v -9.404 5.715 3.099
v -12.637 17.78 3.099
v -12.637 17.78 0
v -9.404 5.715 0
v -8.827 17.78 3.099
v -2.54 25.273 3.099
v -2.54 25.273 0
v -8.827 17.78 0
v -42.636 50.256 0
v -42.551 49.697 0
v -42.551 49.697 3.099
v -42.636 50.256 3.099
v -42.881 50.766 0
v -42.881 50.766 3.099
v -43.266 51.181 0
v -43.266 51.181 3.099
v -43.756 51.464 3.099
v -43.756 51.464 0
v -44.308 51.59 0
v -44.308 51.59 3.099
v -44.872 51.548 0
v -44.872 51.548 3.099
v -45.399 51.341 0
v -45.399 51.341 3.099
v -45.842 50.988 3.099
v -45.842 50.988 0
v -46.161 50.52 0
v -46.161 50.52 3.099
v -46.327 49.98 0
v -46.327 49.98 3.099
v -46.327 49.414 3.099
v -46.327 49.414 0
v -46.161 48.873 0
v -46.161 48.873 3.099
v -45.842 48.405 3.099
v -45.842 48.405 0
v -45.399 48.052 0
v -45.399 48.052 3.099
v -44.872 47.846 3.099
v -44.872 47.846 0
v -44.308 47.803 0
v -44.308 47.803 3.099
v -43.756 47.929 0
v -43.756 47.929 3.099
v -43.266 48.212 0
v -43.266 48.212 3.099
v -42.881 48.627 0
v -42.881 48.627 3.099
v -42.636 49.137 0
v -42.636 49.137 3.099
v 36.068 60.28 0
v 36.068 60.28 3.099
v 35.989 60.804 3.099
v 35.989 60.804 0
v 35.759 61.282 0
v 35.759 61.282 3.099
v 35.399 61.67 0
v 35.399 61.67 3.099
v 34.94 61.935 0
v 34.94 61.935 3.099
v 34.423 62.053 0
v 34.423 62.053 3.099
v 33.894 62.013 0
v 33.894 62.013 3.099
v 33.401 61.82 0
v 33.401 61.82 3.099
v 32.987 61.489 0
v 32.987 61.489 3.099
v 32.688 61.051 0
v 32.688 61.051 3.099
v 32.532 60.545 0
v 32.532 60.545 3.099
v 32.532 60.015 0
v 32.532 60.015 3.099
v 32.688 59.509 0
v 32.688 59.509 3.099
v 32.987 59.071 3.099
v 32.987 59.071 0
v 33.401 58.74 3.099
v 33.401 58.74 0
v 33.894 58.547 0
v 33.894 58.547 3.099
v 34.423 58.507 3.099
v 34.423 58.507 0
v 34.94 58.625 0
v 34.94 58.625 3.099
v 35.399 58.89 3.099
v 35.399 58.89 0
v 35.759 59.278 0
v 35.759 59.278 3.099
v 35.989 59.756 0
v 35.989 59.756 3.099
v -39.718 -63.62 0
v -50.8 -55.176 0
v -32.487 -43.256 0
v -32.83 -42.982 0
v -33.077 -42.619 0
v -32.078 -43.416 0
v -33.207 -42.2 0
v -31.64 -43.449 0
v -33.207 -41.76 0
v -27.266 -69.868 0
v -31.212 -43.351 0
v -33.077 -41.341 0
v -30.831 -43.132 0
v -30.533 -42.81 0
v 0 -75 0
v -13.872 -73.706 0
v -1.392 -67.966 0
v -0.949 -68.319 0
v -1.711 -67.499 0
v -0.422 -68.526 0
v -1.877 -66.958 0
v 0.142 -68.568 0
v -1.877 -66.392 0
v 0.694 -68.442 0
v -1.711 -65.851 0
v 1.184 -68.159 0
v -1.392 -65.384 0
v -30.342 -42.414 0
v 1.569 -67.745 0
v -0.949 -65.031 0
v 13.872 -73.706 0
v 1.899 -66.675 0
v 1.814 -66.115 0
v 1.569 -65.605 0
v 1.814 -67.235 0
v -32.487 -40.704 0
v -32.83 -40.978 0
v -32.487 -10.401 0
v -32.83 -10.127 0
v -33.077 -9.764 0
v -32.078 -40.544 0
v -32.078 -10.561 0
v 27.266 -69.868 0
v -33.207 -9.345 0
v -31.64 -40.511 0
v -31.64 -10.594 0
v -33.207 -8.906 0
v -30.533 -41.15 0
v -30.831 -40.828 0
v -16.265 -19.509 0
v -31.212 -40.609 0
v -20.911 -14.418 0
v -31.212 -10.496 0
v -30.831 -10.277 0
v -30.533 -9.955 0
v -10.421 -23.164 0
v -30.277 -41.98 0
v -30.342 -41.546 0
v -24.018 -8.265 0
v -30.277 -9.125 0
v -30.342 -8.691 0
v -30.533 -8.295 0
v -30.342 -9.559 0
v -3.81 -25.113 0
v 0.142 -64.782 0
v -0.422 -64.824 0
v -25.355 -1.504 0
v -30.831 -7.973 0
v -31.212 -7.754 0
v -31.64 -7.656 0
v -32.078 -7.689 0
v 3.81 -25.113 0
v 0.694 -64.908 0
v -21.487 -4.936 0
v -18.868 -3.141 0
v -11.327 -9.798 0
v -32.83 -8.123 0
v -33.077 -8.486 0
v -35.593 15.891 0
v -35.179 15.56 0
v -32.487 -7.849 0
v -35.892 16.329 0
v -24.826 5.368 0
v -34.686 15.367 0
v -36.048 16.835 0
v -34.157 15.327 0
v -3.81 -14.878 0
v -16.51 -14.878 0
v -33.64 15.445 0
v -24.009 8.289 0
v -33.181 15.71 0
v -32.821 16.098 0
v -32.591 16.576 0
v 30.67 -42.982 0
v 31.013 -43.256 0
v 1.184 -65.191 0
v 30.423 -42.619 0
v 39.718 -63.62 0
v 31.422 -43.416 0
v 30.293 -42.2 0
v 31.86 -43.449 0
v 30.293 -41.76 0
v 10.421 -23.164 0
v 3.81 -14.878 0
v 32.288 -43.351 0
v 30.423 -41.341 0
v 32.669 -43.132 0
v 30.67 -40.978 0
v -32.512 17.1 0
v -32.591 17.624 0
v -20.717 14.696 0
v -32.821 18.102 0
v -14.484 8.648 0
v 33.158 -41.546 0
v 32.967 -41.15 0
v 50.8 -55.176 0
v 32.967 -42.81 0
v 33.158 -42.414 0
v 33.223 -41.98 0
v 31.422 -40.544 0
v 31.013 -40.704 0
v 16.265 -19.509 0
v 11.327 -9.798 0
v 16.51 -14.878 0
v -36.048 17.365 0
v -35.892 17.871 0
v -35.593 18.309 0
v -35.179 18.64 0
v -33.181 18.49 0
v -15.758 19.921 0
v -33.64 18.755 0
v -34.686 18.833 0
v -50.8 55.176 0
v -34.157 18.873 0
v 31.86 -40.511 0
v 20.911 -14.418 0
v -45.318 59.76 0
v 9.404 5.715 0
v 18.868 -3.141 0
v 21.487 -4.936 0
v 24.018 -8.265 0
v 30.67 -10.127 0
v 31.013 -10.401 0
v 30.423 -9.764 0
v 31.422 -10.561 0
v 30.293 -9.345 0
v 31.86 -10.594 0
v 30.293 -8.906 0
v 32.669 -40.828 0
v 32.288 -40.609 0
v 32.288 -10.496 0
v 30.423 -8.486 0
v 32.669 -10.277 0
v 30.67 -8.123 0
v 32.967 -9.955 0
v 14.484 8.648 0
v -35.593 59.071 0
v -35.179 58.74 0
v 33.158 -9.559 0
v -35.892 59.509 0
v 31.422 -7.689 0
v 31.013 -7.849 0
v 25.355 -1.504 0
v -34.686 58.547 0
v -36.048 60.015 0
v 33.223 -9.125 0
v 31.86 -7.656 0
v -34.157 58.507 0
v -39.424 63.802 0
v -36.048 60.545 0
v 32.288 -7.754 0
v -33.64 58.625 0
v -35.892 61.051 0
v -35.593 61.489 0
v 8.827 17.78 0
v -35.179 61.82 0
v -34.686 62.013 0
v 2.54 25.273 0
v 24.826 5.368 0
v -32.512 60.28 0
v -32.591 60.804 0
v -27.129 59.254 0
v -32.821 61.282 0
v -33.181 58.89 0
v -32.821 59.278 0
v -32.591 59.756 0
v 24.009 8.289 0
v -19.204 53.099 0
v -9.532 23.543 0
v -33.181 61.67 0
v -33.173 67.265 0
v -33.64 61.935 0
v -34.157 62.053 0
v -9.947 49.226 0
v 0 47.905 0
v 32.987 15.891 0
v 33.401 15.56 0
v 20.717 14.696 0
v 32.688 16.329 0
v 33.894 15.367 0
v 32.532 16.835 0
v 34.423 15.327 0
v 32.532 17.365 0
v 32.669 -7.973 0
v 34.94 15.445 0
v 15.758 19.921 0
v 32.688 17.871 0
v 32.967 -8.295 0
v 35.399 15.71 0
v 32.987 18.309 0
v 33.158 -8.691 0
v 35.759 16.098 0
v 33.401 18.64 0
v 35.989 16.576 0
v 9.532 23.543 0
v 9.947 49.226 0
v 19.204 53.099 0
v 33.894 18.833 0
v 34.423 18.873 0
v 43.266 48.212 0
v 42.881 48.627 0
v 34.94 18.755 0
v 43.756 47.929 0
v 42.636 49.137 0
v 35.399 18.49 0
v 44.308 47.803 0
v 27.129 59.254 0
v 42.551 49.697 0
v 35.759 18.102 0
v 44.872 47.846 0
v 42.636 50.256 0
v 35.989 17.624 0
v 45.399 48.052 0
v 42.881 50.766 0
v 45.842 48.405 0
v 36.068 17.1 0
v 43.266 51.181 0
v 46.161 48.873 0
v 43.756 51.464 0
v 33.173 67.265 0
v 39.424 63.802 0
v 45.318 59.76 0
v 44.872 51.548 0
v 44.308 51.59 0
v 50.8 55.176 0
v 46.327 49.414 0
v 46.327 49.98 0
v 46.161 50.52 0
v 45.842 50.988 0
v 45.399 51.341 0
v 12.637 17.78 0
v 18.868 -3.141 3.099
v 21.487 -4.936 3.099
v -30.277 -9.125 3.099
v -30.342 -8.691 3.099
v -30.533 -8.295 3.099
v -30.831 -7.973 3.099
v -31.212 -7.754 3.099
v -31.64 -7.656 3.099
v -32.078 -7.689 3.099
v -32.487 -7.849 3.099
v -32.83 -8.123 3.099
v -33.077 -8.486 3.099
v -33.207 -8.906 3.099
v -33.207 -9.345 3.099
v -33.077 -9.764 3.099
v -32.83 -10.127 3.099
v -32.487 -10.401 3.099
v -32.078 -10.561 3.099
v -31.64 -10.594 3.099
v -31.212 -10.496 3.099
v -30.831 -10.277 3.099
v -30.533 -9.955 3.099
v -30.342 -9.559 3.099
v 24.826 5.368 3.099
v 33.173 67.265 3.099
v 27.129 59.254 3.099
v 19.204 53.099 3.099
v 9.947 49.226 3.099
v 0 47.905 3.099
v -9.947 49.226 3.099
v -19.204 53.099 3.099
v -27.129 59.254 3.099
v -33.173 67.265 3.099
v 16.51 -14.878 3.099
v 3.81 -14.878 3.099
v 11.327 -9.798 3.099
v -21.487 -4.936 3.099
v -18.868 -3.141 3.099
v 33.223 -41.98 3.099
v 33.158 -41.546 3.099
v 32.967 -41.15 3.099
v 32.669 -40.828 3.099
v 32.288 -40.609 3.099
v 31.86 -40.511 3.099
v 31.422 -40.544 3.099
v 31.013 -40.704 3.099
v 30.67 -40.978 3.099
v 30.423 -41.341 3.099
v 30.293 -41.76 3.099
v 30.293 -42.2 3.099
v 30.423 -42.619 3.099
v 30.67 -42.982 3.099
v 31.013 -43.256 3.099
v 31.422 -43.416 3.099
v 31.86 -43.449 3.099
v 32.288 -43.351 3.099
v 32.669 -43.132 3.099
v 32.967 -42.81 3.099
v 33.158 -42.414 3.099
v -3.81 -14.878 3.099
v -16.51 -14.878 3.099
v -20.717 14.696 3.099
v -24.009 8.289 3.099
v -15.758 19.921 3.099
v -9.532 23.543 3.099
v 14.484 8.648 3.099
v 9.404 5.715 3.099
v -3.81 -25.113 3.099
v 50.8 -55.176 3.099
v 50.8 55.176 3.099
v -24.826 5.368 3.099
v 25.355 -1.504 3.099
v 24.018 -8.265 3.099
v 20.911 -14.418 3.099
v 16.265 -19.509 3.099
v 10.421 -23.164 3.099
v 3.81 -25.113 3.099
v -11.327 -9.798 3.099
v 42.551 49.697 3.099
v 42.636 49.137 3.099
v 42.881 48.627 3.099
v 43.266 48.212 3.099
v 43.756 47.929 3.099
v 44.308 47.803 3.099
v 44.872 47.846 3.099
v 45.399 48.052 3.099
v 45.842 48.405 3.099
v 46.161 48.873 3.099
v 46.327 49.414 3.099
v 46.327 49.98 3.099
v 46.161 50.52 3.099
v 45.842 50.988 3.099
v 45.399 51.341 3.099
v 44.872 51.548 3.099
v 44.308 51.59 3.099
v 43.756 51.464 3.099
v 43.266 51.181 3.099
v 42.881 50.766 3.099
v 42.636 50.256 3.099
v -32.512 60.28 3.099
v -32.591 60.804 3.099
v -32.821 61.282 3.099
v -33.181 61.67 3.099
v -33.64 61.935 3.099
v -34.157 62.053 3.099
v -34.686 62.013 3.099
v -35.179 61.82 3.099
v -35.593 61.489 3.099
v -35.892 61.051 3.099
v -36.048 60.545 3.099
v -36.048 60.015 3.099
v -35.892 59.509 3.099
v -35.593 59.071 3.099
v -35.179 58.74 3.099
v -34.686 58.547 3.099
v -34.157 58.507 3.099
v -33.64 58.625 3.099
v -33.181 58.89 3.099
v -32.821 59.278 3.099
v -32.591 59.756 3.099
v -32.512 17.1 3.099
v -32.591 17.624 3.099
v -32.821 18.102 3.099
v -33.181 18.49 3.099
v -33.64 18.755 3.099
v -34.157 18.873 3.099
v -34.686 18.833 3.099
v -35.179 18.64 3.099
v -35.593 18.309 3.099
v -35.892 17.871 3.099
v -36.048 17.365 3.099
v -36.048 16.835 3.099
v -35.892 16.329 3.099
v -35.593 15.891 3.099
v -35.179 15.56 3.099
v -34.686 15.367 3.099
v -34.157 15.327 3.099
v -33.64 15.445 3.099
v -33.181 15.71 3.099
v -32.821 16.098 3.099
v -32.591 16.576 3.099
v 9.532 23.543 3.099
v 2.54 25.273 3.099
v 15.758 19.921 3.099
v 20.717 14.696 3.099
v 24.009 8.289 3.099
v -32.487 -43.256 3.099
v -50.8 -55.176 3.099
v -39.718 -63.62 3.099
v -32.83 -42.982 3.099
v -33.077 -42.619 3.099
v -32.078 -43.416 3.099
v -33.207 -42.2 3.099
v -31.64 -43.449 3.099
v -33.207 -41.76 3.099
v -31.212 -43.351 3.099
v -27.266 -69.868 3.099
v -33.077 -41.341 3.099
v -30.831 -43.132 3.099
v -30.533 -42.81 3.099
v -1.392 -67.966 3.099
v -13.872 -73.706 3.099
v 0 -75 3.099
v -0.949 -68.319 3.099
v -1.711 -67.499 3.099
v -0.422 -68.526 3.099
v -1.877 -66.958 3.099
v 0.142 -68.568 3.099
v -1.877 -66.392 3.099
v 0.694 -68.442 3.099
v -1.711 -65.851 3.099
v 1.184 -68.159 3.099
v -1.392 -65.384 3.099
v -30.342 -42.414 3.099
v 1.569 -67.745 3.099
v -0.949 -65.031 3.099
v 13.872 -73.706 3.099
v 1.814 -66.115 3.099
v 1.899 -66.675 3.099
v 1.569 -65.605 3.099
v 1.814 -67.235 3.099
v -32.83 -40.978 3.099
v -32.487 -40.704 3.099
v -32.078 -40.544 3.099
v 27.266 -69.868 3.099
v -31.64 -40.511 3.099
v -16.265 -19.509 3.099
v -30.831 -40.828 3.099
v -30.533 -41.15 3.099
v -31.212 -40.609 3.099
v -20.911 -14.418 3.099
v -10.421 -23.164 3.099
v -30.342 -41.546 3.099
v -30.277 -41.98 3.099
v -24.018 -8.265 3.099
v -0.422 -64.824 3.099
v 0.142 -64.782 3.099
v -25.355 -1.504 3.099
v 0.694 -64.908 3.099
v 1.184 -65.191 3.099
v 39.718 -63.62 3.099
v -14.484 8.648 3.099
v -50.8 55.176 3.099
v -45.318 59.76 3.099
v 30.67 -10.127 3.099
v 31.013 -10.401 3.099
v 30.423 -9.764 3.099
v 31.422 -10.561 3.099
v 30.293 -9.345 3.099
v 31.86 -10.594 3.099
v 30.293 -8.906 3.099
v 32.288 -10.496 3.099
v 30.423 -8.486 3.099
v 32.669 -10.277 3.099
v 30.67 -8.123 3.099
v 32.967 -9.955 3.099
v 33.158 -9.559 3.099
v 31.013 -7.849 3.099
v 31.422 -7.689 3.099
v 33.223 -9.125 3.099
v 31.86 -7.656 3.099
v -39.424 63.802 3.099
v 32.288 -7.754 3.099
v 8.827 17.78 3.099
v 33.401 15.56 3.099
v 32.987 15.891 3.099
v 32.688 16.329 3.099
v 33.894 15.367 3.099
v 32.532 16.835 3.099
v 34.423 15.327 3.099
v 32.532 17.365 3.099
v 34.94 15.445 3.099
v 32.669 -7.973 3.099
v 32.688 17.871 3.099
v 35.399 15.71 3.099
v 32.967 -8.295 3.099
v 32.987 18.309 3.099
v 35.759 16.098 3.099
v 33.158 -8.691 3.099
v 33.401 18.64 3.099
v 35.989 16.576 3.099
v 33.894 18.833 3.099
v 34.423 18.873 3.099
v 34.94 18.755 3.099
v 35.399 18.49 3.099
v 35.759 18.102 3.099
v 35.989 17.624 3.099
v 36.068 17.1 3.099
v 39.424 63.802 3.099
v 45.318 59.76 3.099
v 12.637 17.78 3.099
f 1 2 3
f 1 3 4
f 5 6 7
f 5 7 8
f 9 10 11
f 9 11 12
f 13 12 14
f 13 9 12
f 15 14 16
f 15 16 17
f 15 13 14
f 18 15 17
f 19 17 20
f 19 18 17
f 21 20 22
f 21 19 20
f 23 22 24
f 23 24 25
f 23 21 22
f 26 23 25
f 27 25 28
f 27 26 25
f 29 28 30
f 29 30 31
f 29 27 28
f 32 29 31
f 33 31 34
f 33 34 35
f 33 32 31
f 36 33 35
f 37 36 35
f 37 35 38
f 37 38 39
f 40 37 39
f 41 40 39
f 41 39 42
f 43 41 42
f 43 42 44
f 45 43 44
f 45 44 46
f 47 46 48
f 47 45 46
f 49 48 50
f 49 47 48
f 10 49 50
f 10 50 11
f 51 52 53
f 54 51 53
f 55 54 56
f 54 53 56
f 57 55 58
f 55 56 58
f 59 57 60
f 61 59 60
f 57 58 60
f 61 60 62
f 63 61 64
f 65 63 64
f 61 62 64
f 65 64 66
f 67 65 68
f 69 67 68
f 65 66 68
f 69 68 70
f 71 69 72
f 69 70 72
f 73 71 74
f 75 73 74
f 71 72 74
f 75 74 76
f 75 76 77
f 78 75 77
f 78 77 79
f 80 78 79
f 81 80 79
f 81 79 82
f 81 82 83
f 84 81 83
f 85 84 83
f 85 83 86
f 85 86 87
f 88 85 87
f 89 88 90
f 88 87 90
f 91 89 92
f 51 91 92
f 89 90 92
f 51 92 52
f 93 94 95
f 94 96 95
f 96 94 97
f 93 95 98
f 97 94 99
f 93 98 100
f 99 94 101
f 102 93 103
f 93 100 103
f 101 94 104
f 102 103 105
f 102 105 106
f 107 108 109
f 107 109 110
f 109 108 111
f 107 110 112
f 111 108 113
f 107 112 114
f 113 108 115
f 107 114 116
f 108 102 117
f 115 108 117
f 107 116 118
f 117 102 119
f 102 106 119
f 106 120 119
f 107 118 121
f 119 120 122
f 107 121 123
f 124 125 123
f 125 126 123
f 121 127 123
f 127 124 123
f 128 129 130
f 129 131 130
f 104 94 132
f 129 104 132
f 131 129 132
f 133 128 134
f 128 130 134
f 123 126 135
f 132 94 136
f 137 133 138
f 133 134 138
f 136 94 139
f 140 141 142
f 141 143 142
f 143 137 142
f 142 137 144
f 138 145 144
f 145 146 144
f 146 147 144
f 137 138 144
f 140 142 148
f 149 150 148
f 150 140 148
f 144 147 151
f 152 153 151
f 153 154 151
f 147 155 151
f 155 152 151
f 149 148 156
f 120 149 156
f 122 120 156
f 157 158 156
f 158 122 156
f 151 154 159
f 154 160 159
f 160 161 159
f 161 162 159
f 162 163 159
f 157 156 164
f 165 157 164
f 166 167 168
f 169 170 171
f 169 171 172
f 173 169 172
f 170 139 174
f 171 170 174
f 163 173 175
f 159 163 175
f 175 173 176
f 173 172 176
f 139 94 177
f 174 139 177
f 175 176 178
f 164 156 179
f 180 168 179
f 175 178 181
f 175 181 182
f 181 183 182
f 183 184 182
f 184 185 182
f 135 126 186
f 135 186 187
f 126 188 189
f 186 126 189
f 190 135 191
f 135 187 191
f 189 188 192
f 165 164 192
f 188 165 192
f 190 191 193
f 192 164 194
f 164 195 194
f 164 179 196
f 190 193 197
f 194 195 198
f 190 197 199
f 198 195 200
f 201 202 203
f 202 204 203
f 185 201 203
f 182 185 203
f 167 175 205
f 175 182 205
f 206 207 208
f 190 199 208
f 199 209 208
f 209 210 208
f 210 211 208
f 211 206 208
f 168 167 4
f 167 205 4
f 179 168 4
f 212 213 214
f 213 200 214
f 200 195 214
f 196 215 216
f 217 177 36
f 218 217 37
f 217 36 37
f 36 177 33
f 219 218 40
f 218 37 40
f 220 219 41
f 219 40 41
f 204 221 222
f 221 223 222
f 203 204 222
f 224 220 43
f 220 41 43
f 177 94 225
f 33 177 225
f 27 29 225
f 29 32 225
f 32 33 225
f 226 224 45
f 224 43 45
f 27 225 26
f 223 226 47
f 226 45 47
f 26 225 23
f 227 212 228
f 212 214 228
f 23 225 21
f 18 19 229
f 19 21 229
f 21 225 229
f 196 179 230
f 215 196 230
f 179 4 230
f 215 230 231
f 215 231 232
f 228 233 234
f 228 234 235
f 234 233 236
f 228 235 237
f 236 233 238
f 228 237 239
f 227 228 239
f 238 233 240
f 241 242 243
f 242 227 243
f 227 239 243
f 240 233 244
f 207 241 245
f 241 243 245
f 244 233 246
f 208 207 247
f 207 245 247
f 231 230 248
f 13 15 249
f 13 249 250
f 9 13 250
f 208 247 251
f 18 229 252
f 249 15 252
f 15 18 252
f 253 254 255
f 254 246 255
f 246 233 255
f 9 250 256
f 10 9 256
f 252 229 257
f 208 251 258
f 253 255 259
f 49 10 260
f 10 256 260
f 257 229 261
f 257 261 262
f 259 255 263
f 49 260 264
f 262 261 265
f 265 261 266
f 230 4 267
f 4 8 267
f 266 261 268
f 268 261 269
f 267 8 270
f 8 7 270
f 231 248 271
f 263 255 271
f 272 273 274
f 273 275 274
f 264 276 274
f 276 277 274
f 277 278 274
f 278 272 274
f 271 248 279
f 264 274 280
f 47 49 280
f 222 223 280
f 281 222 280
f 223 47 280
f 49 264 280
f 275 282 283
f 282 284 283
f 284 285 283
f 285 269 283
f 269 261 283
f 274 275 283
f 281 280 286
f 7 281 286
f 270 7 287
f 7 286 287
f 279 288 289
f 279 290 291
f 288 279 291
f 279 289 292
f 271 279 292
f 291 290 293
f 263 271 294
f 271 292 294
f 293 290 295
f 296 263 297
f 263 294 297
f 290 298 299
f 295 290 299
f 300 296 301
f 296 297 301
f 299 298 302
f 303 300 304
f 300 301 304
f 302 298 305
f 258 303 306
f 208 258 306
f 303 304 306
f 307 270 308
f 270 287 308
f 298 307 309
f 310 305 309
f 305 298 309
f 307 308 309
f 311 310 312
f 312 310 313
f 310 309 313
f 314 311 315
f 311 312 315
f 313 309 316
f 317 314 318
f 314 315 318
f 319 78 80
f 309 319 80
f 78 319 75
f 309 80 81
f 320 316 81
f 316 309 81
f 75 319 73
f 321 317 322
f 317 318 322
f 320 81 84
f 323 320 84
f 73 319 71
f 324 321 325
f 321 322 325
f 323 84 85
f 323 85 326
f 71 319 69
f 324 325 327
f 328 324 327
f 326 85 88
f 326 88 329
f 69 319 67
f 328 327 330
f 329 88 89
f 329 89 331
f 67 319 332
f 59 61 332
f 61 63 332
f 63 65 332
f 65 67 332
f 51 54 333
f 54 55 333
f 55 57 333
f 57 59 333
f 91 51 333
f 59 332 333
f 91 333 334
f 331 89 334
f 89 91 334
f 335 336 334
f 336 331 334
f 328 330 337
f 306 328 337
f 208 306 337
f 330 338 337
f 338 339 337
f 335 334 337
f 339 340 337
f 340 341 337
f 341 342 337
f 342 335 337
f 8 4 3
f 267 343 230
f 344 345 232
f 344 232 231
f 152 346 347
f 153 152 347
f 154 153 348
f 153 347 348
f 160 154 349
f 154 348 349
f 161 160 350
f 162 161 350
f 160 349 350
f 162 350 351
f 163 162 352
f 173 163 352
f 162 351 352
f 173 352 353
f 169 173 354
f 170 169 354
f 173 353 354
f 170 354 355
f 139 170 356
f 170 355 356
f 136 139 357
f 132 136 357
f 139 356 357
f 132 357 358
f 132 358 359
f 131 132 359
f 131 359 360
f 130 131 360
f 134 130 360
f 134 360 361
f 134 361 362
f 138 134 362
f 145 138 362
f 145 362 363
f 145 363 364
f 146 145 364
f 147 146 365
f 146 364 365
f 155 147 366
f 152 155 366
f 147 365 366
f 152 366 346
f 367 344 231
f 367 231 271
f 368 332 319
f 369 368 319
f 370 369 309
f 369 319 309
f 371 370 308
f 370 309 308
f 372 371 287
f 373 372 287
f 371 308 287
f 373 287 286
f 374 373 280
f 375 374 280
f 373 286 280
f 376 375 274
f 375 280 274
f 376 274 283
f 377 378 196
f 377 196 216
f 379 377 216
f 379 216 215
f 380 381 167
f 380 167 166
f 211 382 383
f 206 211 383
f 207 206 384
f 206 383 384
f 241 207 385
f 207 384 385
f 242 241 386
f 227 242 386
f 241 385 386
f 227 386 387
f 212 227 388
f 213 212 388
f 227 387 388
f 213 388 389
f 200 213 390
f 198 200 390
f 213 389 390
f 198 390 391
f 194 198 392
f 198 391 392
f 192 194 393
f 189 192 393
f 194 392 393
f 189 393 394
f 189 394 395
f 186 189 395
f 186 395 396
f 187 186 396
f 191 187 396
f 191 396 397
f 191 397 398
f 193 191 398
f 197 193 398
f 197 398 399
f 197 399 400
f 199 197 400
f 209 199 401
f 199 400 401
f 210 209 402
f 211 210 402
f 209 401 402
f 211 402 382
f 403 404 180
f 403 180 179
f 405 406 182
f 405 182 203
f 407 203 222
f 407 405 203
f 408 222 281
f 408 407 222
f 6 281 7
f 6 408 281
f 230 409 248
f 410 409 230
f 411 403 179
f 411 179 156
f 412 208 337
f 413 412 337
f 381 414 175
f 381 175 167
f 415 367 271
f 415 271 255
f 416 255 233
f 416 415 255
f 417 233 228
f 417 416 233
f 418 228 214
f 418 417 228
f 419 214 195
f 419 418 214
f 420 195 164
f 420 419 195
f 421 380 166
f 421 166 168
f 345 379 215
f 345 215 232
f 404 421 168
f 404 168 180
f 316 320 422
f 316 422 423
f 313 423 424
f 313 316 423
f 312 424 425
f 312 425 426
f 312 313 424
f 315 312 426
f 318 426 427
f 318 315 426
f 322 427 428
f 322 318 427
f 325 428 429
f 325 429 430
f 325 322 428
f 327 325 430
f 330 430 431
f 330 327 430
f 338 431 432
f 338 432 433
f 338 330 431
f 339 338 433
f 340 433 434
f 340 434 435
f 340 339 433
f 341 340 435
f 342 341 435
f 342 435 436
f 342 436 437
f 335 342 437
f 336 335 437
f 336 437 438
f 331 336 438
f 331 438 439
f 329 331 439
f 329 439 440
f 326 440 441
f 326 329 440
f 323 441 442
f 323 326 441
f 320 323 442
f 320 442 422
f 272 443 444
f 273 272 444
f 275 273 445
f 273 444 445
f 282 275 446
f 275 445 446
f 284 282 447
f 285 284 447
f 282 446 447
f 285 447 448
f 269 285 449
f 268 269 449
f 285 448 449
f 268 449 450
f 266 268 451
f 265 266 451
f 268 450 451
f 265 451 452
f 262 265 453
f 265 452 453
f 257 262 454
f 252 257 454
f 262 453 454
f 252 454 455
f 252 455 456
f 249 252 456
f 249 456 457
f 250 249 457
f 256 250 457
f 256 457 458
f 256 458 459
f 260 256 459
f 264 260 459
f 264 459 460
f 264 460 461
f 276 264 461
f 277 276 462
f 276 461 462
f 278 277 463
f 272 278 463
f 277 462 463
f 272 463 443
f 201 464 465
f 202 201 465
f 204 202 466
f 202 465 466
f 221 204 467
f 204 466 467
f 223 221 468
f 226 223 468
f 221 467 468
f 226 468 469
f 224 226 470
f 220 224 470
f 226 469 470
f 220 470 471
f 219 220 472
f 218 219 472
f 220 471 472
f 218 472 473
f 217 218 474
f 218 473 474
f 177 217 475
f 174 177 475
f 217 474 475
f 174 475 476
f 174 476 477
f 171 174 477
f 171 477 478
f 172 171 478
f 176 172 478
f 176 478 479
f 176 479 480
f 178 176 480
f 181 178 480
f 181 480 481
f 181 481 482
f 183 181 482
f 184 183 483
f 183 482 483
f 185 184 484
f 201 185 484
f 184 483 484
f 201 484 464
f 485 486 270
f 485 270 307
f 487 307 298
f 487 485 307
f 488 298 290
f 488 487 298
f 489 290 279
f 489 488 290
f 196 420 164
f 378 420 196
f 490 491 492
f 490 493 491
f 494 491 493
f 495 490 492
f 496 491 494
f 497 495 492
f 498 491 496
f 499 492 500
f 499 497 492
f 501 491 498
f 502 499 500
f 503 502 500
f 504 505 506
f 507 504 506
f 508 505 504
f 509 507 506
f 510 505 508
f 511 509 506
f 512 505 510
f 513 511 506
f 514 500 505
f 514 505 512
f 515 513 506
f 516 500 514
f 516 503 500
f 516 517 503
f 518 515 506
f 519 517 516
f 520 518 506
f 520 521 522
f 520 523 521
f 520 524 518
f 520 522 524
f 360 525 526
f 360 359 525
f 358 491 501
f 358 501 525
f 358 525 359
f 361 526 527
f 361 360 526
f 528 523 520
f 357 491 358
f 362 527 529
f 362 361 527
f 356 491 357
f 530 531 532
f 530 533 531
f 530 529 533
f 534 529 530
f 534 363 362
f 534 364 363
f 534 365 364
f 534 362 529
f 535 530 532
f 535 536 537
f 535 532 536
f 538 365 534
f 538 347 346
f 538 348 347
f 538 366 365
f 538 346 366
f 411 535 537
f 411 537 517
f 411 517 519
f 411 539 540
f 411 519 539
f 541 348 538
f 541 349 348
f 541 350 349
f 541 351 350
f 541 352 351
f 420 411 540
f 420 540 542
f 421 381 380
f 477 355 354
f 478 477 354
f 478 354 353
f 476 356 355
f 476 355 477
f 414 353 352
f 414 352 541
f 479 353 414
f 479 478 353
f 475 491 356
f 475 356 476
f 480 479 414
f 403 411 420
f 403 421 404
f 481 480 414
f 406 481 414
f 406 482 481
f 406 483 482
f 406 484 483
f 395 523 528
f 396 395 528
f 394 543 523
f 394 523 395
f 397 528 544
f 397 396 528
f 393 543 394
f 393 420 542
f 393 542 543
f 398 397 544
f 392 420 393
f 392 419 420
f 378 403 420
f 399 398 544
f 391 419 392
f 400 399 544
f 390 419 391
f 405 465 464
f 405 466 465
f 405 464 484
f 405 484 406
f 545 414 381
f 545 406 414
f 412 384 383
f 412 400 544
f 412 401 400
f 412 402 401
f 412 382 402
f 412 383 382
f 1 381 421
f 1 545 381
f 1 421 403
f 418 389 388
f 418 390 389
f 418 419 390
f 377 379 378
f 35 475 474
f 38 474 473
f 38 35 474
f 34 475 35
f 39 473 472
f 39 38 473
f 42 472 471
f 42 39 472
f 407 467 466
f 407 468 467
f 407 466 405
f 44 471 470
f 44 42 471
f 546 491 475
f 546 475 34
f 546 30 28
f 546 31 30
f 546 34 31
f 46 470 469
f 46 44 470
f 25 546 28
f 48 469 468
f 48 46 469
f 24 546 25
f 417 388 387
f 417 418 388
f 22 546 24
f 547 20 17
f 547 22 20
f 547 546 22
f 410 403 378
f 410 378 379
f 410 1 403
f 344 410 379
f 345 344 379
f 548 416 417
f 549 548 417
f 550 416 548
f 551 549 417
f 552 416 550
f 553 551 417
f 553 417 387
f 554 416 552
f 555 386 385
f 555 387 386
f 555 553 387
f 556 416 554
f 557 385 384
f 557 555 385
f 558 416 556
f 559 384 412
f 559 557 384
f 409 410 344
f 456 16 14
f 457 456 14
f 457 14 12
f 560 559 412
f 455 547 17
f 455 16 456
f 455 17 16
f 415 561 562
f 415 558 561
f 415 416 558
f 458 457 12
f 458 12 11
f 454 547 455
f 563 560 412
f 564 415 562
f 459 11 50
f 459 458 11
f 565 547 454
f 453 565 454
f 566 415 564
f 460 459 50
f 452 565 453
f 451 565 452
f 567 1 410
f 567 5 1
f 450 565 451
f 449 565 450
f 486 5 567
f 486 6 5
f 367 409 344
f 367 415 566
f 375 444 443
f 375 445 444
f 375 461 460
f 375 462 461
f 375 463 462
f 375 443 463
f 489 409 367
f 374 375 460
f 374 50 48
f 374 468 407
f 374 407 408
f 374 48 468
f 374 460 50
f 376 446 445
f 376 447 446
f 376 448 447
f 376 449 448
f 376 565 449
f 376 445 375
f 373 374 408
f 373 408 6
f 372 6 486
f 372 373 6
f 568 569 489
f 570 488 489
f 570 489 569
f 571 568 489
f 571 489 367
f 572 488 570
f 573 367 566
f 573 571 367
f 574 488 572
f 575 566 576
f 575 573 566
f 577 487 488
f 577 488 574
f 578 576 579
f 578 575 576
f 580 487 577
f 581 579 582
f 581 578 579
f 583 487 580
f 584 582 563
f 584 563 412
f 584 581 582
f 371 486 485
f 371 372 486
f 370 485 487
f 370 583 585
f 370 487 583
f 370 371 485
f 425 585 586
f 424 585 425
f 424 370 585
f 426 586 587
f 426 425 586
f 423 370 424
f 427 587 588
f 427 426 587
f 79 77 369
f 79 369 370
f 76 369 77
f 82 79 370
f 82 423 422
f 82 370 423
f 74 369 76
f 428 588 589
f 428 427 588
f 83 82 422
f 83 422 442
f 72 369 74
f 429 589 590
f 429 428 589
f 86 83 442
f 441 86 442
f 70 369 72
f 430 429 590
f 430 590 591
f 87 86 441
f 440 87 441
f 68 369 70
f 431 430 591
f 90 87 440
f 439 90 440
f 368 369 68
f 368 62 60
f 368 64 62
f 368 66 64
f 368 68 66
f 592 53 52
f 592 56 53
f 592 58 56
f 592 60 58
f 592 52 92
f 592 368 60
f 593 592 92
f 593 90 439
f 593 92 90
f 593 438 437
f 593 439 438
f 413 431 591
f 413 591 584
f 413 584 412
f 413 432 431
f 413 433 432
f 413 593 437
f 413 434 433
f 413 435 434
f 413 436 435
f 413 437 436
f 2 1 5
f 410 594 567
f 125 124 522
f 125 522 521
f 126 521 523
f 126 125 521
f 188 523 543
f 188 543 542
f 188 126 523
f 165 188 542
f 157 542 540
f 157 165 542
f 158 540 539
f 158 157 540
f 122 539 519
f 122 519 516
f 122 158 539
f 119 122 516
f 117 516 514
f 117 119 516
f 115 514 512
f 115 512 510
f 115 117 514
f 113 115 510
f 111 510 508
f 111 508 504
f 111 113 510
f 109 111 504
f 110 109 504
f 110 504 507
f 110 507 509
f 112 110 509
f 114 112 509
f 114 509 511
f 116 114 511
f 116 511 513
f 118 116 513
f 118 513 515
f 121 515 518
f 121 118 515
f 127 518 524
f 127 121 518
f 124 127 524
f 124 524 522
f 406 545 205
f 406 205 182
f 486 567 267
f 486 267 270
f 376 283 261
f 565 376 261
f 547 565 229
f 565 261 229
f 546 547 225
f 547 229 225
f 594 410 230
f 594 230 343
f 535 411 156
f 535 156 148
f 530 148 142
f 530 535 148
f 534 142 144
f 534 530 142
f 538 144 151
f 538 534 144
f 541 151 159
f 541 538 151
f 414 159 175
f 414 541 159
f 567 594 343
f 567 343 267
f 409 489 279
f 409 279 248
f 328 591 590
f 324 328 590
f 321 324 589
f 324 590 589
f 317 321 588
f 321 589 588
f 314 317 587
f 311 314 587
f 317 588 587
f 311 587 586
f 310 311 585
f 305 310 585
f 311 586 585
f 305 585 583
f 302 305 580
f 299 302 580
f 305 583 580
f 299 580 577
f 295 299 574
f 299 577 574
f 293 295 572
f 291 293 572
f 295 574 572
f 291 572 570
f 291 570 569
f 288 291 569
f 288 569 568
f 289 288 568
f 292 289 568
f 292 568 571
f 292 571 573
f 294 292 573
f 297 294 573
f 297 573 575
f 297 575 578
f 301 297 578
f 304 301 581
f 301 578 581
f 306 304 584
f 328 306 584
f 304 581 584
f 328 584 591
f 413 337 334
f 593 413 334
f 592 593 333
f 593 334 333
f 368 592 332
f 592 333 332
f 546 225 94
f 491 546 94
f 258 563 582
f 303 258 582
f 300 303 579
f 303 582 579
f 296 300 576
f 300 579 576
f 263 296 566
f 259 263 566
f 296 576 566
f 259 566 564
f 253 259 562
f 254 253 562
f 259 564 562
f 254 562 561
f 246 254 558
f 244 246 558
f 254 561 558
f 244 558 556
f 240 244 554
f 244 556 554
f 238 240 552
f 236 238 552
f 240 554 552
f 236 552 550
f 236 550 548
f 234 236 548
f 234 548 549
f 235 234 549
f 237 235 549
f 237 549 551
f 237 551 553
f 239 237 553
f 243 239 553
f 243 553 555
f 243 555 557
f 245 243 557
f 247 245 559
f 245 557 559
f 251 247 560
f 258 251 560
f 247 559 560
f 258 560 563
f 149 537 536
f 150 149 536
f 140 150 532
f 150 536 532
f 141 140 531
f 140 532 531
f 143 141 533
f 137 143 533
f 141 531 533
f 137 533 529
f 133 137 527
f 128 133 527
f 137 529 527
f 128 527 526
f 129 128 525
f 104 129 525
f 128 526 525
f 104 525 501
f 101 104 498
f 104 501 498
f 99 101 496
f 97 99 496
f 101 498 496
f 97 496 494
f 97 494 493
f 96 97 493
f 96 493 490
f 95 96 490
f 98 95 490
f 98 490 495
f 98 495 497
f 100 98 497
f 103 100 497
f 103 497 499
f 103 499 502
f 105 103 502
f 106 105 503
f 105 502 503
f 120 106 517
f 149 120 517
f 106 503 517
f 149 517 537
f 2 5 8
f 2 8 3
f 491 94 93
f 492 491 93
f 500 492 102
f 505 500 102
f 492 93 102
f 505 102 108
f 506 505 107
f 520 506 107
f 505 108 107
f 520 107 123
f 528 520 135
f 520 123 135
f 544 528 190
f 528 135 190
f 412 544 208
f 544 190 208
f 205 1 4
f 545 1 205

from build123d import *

# Parameters (mm, degrees)
SKETCH1_R           = 1.89865
BOSS_EXTRUDE3_DEPTH = 3.0988
SKETCH2_R           = 1.4732
CUT_EXTRUDE1_DEPTH  = 3.0988
CUT_EXTRUDE2_DEPTH  = 3.0988
SKETCH4_R           = 1.778
CUT_EXTRUDE3_DEPTH  = 3.0988


with BuildPart() as part:
    # Sketch1 → Boss-Extrude3 (new body)
    with BuildSketch(Plane.XY):
        with BuildLine():
            Line((-50.8, 55.175719298), (-50.8, -55.175719298))
            ThreePointArc((-50.8, -55.175719298), (0, -75), (50.8, -55.175719298))
            Line((50.8, -55.175719298), (50.8, 55.175719298))
            ThreePointArc((50.8, 55.175719298), (42.419210034, 61.851520758), (33.172661219, 67.264957799))
            ThreePointArc((33.172661219, 67.264957799), (0, 47.904876359), (-33.172661219, 67.264957799))
            ThreePointArc((-33.172661219, 67.264957799), (-42.419210034, 61.851520758), (-50.8, 55.175719298))
        make_face()
        with Locations((0, -66.675)):
            Circle(SKETCH1_R, mode=Mode.SUBTRACT)
        with Locations((-44.45, 49.6966108)):
            Circle(SKETCH1_R, mode=Mode.SUBTRACT)
        with Locations(Location((44.45, 49.6966108, 0), (0, 0, 180))):
            Circle(SKETCH1_R, mode=Mode.SUBTRACT)
    extrude(amount=BOSS_EXTRUDE3_DEPTH)

    # Sketch2 → Cut-Extrude1 (cut)
    with BuildSketch(Plane.XY.offset(3.0988)):
        with Locations((-31.75, -41.98)):
            Circle(SKETCH2_R)
        with Locations((31.75, -41.98)):
            Circle(SKETCH2_R)
        with Locations((-31.75, -9.1251)):
            Circle(SKETCH2_R)
        with Locations((31.75, -9.1251)):
            Circle(SKETCH2_R)
    extrude(amount=-CUT_EXTRUDE1_DEPTH, mode=Mode.SUBTRACT)

    # Sketch3 → Cut-Extrude2 (cut)
    with BuildSketch(Plane.XY.offset(3.0988)):
        with BuildLine():
            Line((8.827105782, 17.78), (2.54, 25.272680903))
            ThreePointArc((2.54, 25.272680903), (15.758317518, 19.920728626), (24.009298775, 8.289365013))
            Line((24.009298775, 8.289365013), (14.484298775, 8.647939367))
            Line((14.484298775, 8.647939367), (9.404298775, 5.715))
            Line((9.404298775, 5.715), (12.637105782, 17.78))
            Line((12.637105782, 17.78), (8.827105782, 17.78))
        make_face()
        with BuildLine():
            Line((18.868143133, -3.140634987), (24.826209076, 5.368365013))
            ThreePointArc((24.826209076, 5.368365013), (20.911260009, -14.418016674), (3.81, -25.112624315))
            Line((3.81, -25.112624315), (3.81, -14.877877919))
            Line((3.81, -14.877877919), (16.51, -14.877877919))
            Line((16.51, -14.877877919), (11.327081569, -9.797877919))
            Line((11.327081569, -9.797877919), (21.487081569, -4.935568543))
            Line((21.487081569, -4.935568543), (18.868143133, -3.140634987))
        make_face()
        with BuildLine():
            Line((-3.81, -14.877877919), (-3.81, -25.112624315))
            ThreePointArc((-3.81, -25.112624315), (-20.911260009, -14.418016674), (-24.826209076, 5.368365013))
            Line((-24.826209076, 5.368365013), (-18.868143133, -3.140634987))
            Line((-18.868143133, -3.140634987), (-21.487081569, -4.935568543))
            Line((-21.487081569, -4.935568543), (-11.327081569, -9.797877919))
            Line((-11.327081569, -9.797877919), (-16.51, -14.877877919))
            Line((-16.51, -14.877877919), (-3.81, -14.877877919))
        make_face()
        with BuildLine():
            Line((-14.484298775, 8.647939367), (-24.009298775, 8.289365013))
            ThreePointArc((-24.009298775, 8.289365013), (-15.758317518, 19.920728626), (-2.54, 25.272680903))
            Line((-2.54, 25.272680903), (-8.827105782, 17.78))
            Line((-8.827105782, 17.78), (-12.637105782, 17.78))
            Line((-12.637105782, 17.78), (-9.404298775, 5.715))
            Line((-9.404298775, 5.715), (-14.484298775, 8.647939367))
        make_face()
    extrude(amount=-CUT_EXTRUDE2_DEPTH, mode=Mode.SUBTRACT)

    # Sketch4 → Cut-Extrude3 (cut)
    with BuildSketch(Plane.XY.offset(3.0988)):
        with Locations((-34.29, 60.279957799)):
            Circle(SKETCH4_R)
        with Locations((34.29, 60.279957799)):
            Circle(SKETCH4_R)
        with Locations((34.29, 17.099957799)):
            Circle(SKETCH4_R)
        with Locations((-34.29, 17.099957799)):
            Circle(SKETCH4_R)
    extrude(amount=-CUT_EXTRUDE3_DEPTH, mode=Mode.SUBTRACT)


solid = part.part
